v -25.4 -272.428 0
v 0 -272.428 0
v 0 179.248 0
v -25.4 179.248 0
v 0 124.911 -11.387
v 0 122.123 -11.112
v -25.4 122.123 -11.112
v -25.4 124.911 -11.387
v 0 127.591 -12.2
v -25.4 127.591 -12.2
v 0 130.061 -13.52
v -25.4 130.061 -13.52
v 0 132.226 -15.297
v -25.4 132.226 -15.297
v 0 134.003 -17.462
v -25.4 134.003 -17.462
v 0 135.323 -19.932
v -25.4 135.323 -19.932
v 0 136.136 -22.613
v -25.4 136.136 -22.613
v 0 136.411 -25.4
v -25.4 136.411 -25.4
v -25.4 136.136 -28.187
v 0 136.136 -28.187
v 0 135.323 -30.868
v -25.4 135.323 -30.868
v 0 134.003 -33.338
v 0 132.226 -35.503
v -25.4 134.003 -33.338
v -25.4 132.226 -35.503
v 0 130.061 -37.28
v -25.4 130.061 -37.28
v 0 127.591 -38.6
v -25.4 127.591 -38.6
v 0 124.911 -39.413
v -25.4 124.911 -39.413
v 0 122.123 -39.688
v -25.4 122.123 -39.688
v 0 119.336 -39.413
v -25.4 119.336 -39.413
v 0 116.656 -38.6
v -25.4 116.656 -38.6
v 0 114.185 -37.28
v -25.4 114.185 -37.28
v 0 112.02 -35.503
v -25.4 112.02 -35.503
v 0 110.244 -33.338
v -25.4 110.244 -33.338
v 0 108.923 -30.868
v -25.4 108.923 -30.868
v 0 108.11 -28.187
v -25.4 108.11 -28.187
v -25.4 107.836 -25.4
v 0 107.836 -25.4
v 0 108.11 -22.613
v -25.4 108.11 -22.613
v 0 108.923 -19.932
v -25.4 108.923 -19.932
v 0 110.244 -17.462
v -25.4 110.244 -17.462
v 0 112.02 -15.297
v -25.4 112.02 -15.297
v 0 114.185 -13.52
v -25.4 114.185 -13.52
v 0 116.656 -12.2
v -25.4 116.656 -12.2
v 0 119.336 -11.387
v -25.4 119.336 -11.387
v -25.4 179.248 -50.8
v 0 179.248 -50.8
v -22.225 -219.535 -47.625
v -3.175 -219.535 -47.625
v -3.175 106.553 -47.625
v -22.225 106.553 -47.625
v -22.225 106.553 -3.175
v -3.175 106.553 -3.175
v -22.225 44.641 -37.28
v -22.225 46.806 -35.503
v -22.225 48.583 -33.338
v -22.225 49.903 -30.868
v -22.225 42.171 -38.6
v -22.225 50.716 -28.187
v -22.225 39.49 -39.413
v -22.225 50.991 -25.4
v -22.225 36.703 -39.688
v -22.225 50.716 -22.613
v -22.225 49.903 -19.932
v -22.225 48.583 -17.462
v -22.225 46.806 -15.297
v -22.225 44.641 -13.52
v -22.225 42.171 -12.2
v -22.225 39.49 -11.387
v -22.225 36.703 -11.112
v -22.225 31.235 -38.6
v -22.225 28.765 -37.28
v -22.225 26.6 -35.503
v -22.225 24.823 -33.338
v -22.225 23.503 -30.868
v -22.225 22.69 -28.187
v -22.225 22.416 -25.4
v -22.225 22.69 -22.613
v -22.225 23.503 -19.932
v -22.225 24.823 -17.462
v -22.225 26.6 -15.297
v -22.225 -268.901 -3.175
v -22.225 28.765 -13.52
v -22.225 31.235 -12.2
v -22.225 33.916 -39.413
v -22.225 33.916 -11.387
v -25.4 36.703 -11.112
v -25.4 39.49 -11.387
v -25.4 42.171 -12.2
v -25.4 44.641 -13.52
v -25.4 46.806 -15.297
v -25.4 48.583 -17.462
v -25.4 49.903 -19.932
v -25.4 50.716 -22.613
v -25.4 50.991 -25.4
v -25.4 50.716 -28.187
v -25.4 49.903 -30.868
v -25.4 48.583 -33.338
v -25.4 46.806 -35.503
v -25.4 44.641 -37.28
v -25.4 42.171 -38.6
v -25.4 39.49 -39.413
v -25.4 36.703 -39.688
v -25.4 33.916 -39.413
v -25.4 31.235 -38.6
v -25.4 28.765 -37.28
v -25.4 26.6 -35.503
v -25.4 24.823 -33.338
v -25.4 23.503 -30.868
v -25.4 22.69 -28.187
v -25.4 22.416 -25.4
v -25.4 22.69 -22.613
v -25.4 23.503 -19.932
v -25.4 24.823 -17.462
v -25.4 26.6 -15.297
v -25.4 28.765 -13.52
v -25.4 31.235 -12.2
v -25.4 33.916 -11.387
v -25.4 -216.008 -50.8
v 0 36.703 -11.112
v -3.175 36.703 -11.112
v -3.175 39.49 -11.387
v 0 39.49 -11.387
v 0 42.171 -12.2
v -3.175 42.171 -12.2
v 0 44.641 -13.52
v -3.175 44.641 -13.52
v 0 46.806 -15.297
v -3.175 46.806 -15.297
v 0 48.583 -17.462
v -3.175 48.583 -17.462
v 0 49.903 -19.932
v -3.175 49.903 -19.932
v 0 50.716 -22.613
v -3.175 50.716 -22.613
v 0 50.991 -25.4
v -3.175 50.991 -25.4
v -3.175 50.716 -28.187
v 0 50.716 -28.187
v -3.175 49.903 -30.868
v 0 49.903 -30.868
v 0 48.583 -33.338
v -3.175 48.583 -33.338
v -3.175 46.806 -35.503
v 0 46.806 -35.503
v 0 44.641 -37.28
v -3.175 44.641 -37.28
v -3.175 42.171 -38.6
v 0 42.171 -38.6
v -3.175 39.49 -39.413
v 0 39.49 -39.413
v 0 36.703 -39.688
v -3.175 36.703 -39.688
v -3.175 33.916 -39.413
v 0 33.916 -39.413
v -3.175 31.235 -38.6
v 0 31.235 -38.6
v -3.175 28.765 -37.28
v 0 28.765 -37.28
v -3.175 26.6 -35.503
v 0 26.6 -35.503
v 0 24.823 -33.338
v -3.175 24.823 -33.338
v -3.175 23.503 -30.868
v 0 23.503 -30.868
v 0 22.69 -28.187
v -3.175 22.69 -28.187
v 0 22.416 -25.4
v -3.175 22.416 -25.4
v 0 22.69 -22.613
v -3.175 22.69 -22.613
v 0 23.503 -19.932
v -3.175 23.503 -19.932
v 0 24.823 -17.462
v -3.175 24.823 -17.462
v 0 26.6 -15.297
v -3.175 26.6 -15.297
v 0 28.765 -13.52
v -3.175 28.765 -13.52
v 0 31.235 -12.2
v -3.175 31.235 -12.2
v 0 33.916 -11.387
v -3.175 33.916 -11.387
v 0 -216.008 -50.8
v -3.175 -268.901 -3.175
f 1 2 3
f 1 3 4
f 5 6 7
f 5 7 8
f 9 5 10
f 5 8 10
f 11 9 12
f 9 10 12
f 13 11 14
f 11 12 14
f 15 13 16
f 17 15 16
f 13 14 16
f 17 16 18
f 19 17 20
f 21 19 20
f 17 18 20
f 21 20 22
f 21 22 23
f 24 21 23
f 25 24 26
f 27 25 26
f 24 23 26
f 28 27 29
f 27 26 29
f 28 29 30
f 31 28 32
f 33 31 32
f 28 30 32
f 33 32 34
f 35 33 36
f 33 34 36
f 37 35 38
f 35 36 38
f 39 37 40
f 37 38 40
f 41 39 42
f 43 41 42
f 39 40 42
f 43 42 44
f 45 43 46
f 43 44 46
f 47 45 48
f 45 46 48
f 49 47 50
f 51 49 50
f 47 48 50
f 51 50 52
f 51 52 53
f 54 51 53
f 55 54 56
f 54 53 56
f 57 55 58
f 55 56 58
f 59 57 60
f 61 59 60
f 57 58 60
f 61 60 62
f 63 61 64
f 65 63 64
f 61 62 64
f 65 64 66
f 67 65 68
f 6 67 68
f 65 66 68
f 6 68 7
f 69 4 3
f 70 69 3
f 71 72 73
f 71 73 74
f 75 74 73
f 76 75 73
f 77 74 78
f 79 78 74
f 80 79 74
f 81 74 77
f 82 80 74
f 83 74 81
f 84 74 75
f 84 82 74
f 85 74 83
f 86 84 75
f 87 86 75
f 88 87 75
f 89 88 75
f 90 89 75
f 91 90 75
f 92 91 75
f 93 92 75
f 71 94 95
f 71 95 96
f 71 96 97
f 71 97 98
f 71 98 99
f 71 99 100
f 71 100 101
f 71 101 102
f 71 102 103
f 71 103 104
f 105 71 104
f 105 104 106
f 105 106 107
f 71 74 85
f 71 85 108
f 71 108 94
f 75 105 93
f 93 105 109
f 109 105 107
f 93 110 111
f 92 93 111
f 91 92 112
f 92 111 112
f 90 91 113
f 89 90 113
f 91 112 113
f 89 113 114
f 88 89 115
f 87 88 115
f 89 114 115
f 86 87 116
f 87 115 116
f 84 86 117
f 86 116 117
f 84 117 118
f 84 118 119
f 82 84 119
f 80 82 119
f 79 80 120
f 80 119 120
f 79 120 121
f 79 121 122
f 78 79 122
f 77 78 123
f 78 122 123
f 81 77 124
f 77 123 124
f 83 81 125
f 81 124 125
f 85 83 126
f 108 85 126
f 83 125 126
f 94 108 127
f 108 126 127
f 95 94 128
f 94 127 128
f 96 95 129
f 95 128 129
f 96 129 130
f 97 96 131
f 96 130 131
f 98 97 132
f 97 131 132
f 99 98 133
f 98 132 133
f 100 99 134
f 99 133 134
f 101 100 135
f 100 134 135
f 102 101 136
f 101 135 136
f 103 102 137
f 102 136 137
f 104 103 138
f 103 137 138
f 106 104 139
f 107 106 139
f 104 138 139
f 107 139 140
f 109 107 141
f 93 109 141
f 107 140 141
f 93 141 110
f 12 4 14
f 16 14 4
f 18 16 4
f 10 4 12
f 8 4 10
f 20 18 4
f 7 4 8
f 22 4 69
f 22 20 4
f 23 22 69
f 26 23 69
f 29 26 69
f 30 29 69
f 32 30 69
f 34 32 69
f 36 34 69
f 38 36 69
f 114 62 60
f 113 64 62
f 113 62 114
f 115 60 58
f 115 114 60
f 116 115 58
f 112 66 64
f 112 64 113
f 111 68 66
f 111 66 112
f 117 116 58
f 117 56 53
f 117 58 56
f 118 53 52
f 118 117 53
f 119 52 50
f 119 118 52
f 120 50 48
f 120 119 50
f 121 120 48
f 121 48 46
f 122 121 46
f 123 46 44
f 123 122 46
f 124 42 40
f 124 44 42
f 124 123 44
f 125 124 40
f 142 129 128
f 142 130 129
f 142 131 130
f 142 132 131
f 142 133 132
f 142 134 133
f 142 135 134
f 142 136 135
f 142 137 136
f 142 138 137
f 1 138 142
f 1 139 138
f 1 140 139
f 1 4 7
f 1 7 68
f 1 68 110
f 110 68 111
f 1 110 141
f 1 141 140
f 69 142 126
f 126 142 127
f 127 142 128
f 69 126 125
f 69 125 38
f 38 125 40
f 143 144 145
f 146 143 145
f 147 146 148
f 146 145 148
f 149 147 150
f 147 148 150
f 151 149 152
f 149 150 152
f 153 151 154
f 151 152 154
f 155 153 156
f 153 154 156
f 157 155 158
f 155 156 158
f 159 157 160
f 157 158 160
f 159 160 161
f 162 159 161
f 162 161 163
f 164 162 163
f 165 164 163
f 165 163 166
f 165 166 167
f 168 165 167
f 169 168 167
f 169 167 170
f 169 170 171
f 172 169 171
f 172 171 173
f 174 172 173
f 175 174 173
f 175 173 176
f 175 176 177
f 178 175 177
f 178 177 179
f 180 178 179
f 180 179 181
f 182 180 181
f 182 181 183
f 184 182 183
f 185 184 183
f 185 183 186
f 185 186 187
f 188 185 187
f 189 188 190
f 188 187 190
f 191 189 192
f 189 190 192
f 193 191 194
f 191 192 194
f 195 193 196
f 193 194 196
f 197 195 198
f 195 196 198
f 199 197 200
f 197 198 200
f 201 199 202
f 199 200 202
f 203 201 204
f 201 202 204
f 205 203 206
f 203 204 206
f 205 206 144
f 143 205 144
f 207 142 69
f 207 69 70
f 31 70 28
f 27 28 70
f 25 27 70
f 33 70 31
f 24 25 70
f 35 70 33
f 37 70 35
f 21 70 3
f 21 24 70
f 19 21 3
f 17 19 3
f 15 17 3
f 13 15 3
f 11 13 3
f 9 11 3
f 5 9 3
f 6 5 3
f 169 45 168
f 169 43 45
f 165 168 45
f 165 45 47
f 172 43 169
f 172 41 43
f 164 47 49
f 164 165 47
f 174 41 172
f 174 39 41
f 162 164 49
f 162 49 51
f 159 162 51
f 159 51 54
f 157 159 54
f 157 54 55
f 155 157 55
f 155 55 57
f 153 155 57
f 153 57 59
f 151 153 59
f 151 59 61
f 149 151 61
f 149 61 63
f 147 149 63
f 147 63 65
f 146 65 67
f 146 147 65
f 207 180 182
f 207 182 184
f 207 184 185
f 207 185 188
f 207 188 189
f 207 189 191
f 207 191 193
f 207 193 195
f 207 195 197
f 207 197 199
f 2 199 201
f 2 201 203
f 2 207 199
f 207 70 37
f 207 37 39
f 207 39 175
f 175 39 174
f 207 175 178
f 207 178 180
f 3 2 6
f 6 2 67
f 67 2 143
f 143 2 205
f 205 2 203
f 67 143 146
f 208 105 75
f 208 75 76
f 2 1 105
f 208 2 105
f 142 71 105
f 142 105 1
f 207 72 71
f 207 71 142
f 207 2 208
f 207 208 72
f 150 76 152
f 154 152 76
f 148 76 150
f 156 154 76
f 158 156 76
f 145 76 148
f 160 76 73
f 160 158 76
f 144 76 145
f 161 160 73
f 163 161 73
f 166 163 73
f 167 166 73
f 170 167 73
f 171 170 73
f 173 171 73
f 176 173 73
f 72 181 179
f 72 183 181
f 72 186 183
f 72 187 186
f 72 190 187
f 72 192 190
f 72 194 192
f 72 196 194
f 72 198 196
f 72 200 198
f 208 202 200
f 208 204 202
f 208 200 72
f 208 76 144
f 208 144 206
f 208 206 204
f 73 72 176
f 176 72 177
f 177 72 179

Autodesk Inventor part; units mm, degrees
ref_plane "YZ Plane" through (0, 0, 0) normal (1, 0, 0) x (0, 1, 0)
ref_plane "XZ Plane" through (0, 0, 0) normal (0, 1, 0) x (-1, 0, 0)
ref_plane "XY Plane" through (0, 0, 0) normal (0, 0, 1) x (1, 0, 0)
sketch "Sketch1" plane through (0, 0, 0) normal (0, 1, 0) x (-1, 0, 0)
  line L0 (0, 0) -> (25.4, 0)
  line L1 (25.4, 0) -> (25.4, -50.8)
  line L2 (25.4, -50.8) -> (0, -50.8)
  line L3 (0, -50.8) -> (0, 0)
  line L4 (22.225, -3.175) -> (3.175, -3.175)
  line L5 (3.175, -3.175) -> (3.175, -47.625)
  line L6 (3.175, -47.625) -> (22.225, -47.625)
  line L7 (22.225, -47.625) -> (22.225, -3.175)
  dimension "d0" = 25.4
  dimension "d1" = 50.8
  dimension "d2" = 3.175
extrude "Extrusion1" add sketch "Sketch1" along normal blind 106.553
sketch "Sketch4" plane through (0, 0, 0) normal (0, -1, 0) x (1, 0, 0)
  line L0 (-22.225, -47.625) -> (-22.225, -3.175) projected
  line L1 (-22.225, -3.175) -> (-3.175, -3.175) projected
  line L2 (-3.175, -3.175) -> (-3.175, -47.625) projected
  line L3 (-3.175, -47.625) -> (-22.225, -47.625) projected
  line L4 (0, 0) -> (-25.4, 0) projected
  line L5 (-25.4, 0) -> (-25.4, -50.8) projected
  line L6 (-25.4, -50.8) -> (0, -50.8) projected
  line L7 (0, -50.8) -> (0, 0) projected
extrude "Extrusion2" add sketch "Sketch4" along normal blind 254
sketch "Sketch5" plane through (0, 106.553, 0) normal (1, 0, 0) x (0, 0, -1)
  line L0 (50.8, 0) -> (50.8, -360.553) projected
  line L1 (0, 0) -> (50.8, 0) projected
  line L2 (0, -360.553) -> (0, 0) projected
  line L3 (50.8, -360.553) -> (0, -360.553) projected
  line L4 (0, -360.553) -> (23.3209, -360.553)
  line L5 (0, -360.553) -> (50.8, -360.553) projected
  line L6 (0, -360.553) -> (9.2137, -369.7667)
  line L7 (0, -360.553) -> (9.2137, -360.553)
  line L8 (9.2137, -360.553) -> (9.2137, -369.7667)
  line L9 (9.2137, -369.7667) -> (0, -369.7667)
  line L10 (0, -369.7667) -> (0, -360.553)
  line L11 (0, -369.7667) -> (0, -378.9805)
  line L12 (0, -378.9805) -> (50.8, -322.5614)
  line L13 (50.8, 0) -> (50.8, -360.553) projected
  line L14 (50.8, -322.5614) -> (0, -322.5614)
  line L15 (0, -322.5614) -> (0, -378.9805)
  line L16 (0, -378.9805) -> (50.8, -378.9805)
  line L17 (50.8, -378.9805) -> (50.8, -322.5614)
  point P0 (0, -106.553)
  dimension "d22" = 13.0302
  dimension "d23" = 45
  dimension "d24" = 48
extrude "Extrusion3" add sketch "Sketch5" against normal blind 25.4 contours L12 L3 L2 L14 | L12 L8 L3 | L8 L12 L6 L3 | L6 L12 L9 L10 | L11 L9 L12
extrude "Extrusion4" cut sketch "Sketch5" against normal blind 25.4 contours L0 L3 L12 | L17 L16 L12 L9 L8 L3 | L8 L6 L12 | L9 L12 L6
sketch "Sketch6" plane through (0, 106.553, 0) normal (0, 1, 0) x (1, 0, 0)
  line L0 (-22.225, 3.175) -> (-22.225, 47.625) projected
  line L1 (-3.175, 3.175) -> (-22.225, 3.175) projected
  line L2 (-3.175, 47.625) -> (-3.175, 3.175) projected
  line L3 (-22.225, 47.625) -> (-3.175, 47.625) projected
  point P0 (0, 0)
extrude "Extrusion5" cut sketch "Sketch6" against normal through all
sketch "Sketch8" plane through (0, 106.553, 0) normal (0, 1, 0) x (1, 0, 0)
  line L0 (0, 50.8) -> (-25.4, 50.8) projected
  line L1 (-25.4, 50.8) -> (-25.4, 0) projected
  line L2 (0, 50.8) -> (-25.4, 50.8)
  line L3 (-25.4, 50.8) -> (-25.4, 0)
  line L4 (-25.4, 0) -> (0, 0)
  line L5 (0, 0) -> (0, 50.8)
  line L6 (-3.175, 47.625) -> (-22.225, 47.625)
  line L7 (-22.225, 47.625) -> (-22.225, 3.175)
  line L8 (-22.225, 3.175) -> (-3.175, 3.175)
  line L9 (-3.175, 3.175) -> (-3.175, 47.625)
  dimension "d39" = 3.175
extrude "Extrusion6" add sketch "Sketch8" along normal blind 72.6948 contours L5 L4 L1 L0 | L9 L8 L7 L6
sketch "Sketch9" plane through (-25.4, -272.4275, 0) normal (-1, 0, 0) x (0, 0, 1)
  circle A0 centre (-25.4, 394.5507) radius 14.2875
  line L0 (-50.8, 451.6753) -> (0, 451.6753) projected
  point P0 (0, 272.4275)
  point P1 (-25.4, 340.8805)
  dimension "d44" = 28.575
  dimension "d45" = 57.1246
extrude "Extrusion7" cut sketch "Sketch9" against normal blind 158.75
sketch "Sketch10" plane through (-25.4, -272.4275, 0) normal (-1, 0, 0) x (0, 0, 1)
  circle A0 centre (-25.4, 309.1305) radius 14.2875
  point P0 (0, 272.4275)
  point P1 (-25.4, 264.6805)
  dimension "d48" = 28.575
  dimension "d49" = 44.45
extrude "Extrusion8" cut sketch "Sketch10" against normal blind 158.75
properties part number "StorageSupport.ver2-1111-2021" material "Aluminum 6061"
